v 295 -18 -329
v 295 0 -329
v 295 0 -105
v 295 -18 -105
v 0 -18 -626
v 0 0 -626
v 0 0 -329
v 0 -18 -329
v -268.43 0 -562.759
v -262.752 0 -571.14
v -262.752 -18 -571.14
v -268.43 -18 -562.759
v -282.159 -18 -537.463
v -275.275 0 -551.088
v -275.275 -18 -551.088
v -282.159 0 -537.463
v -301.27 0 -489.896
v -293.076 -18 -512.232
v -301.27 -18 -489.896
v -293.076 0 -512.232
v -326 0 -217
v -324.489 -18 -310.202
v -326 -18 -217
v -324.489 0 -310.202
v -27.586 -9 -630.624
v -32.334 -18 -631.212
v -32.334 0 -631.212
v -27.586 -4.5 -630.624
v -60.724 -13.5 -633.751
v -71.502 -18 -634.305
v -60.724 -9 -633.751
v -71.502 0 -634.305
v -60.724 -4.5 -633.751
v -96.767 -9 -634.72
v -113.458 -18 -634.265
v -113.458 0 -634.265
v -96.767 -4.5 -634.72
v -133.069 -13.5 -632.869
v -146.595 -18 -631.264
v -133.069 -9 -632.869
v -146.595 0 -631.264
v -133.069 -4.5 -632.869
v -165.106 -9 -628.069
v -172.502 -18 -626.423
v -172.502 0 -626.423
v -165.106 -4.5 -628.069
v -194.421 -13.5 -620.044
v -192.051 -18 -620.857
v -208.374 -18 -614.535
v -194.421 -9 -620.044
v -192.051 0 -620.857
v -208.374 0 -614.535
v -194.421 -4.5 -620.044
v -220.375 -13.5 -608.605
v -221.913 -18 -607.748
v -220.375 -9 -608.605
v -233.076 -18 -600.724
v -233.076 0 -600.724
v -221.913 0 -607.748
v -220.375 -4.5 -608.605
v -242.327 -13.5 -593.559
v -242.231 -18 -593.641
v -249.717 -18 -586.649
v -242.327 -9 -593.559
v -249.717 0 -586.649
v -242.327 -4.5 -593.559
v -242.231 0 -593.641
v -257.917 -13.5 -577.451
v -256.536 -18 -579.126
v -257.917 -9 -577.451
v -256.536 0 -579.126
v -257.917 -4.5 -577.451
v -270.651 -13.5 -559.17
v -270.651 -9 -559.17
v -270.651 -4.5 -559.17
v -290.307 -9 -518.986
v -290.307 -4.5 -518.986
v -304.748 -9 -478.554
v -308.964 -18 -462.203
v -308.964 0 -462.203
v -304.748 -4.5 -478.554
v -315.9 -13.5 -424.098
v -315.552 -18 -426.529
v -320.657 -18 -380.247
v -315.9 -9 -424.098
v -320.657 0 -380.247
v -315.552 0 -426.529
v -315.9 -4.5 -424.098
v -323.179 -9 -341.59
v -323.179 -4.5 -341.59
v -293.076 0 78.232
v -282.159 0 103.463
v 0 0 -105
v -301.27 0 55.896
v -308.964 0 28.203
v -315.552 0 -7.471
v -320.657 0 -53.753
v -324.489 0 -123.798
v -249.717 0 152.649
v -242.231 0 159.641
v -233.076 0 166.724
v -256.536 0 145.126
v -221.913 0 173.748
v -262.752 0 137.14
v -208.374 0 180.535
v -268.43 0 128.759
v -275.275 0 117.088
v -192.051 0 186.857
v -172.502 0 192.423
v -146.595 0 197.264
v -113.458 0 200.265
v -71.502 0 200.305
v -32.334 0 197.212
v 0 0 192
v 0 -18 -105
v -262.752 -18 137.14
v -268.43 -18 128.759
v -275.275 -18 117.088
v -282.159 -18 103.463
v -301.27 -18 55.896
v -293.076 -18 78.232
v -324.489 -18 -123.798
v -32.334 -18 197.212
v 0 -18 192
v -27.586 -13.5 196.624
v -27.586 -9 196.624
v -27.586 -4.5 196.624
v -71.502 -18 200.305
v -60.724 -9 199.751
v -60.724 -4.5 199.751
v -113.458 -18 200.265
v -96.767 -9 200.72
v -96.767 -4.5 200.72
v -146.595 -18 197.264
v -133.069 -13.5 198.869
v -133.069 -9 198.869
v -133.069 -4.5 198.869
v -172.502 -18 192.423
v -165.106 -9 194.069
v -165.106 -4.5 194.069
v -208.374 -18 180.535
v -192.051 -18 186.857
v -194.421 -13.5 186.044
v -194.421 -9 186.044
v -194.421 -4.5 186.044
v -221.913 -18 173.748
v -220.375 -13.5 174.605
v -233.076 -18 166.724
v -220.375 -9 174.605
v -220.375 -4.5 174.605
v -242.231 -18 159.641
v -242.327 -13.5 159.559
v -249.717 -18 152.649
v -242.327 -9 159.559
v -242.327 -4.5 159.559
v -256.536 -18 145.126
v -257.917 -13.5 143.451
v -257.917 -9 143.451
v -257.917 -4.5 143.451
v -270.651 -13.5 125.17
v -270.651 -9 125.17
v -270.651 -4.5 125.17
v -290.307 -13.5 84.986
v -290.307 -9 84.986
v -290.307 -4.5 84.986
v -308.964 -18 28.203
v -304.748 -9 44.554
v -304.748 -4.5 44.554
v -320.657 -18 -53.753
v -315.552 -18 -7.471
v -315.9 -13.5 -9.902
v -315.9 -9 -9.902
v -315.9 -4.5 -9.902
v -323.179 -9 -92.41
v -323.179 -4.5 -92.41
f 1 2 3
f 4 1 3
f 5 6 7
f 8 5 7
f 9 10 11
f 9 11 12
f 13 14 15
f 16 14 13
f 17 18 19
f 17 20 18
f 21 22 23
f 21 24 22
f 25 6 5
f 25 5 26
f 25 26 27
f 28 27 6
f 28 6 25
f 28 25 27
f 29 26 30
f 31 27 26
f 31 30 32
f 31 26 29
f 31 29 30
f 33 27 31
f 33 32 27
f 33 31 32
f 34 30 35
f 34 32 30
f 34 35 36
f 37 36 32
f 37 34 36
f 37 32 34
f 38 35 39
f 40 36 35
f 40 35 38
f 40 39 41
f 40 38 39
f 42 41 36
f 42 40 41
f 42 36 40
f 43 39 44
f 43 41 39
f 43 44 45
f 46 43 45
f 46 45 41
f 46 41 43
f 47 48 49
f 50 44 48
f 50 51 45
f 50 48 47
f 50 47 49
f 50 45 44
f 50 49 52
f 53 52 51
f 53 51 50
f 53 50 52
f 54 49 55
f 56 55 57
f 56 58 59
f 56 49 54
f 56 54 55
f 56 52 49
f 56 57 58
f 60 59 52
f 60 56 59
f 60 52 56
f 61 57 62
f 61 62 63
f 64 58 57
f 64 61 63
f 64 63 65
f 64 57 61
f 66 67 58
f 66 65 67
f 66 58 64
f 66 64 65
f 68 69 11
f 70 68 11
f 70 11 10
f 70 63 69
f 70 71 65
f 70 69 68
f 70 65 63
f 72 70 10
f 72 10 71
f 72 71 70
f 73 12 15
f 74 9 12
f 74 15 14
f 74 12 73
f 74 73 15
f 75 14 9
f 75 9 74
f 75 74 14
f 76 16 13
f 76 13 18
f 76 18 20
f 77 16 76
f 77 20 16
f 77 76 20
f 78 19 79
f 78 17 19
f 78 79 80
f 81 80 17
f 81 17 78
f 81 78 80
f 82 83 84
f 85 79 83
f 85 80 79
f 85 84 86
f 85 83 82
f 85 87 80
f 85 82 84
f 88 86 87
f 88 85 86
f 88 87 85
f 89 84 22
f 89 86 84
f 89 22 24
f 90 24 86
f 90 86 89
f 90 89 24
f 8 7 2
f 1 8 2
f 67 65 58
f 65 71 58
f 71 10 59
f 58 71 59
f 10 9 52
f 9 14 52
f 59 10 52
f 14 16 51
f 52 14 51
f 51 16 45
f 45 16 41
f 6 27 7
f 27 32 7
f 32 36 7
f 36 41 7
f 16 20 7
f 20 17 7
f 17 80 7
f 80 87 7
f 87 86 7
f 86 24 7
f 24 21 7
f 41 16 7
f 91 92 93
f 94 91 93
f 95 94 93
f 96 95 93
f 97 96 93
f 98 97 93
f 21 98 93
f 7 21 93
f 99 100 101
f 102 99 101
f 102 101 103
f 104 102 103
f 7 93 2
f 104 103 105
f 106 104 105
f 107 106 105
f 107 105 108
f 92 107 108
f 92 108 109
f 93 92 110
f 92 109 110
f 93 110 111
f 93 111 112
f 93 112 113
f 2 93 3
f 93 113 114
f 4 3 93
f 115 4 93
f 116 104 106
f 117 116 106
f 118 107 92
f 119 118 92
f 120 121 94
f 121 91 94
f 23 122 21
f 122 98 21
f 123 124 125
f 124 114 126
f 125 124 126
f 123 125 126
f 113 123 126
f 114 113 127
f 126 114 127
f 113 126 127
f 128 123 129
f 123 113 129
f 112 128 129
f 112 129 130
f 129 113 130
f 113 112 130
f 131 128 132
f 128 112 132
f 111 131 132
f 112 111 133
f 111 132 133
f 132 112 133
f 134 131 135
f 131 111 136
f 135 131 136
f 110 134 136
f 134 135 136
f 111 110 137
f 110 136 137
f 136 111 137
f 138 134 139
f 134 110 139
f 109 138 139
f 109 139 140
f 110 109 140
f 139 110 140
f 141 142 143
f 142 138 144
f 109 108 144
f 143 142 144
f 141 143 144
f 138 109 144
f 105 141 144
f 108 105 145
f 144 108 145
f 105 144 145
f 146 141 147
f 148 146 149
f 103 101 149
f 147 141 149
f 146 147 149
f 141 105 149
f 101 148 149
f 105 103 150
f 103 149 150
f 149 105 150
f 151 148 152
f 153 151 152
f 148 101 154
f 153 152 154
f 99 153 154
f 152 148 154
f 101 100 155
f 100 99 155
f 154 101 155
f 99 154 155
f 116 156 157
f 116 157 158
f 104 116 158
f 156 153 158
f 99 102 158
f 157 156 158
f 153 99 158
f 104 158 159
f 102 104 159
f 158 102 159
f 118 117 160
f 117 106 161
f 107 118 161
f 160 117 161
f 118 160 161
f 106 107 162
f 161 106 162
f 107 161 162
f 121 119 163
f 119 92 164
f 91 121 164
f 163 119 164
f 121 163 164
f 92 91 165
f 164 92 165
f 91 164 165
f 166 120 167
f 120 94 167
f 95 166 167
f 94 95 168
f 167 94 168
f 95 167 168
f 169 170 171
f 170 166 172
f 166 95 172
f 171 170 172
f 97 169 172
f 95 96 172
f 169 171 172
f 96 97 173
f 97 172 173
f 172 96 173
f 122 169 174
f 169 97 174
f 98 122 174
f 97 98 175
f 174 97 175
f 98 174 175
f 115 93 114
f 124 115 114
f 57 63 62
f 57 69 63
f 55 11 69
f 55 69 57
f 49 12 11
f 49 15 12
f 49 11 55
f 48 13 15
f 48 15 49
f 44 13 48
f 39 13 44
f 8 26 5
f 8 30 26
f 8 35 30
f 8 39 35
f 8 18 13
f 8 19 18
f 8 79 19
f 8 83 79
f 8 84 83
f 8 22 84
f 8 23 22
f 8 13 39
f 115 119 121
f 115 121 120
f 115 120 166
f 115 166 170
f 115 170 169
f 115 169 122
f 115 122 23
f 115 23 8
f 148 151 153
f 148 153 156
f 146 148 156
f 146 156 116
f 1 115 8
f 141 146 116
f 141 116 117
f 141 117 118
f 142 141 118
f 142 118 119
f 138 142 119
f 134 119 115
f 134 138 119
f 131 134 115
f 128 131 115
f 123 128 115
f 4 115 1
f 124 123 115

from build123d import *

# Parameters (mm, degrees)
F1_DEPTH = 18


# Not quite as in the source:
# - a feature of the source that left no trace in its solid (it failed there, or was rolled back) is left out


with BuildPart() as f1:
    # F0 (on Front) → F1 (new body)
    with BuildSketch(Plane.XZ):
        with BuildLine():
            Line((295, -217), (-326, -217))
            add(Edge.make_bspline(
                [(0, -626), (-31.9041572511, -632.8686919212), (-135.8624745728, -641.8458876021), (-249.8265846826, -605.2490014373), (-303.9460461433, -495.6098595325), (-325.4699671722, -417.4111427766), (-326, -217)],
                knots=[0, 0, 0, 0, 0.234743673, 0.4538776177, 0.6453771431, 1, 1, 1, 1], degree=3))
            Line((0, -626), (0, -329))
            Line((0, -329), (295, -329))
            Line((295, -329), (295, -217))
        make_face()
        with BuildLine():
            add(Edge.make_bspline(
                [(0, 192), (-31.9041572511, 198.8686919212), (-135.8624745728, 207.8458876021), (-249.8265846826, 171.2490014373), (-303.9460461433, 61.6098595325), (-325.4699671722, -16.5888572234), (-326, -217)],
                knots=[0, 0, 0, 0, 0.234743673, 0.4538776177, 0.6453771431, 1, 1, 1, 1], degree=3))
            Line((-326, -217), (295, -217))
            Line((295, -217), (295, -105))
            Line((295, -105), (0, -105))
            Line((0, -105), (0, 192))
        make_face()
    extrude(amount=F1_DEPTH)


solid = f1.part
